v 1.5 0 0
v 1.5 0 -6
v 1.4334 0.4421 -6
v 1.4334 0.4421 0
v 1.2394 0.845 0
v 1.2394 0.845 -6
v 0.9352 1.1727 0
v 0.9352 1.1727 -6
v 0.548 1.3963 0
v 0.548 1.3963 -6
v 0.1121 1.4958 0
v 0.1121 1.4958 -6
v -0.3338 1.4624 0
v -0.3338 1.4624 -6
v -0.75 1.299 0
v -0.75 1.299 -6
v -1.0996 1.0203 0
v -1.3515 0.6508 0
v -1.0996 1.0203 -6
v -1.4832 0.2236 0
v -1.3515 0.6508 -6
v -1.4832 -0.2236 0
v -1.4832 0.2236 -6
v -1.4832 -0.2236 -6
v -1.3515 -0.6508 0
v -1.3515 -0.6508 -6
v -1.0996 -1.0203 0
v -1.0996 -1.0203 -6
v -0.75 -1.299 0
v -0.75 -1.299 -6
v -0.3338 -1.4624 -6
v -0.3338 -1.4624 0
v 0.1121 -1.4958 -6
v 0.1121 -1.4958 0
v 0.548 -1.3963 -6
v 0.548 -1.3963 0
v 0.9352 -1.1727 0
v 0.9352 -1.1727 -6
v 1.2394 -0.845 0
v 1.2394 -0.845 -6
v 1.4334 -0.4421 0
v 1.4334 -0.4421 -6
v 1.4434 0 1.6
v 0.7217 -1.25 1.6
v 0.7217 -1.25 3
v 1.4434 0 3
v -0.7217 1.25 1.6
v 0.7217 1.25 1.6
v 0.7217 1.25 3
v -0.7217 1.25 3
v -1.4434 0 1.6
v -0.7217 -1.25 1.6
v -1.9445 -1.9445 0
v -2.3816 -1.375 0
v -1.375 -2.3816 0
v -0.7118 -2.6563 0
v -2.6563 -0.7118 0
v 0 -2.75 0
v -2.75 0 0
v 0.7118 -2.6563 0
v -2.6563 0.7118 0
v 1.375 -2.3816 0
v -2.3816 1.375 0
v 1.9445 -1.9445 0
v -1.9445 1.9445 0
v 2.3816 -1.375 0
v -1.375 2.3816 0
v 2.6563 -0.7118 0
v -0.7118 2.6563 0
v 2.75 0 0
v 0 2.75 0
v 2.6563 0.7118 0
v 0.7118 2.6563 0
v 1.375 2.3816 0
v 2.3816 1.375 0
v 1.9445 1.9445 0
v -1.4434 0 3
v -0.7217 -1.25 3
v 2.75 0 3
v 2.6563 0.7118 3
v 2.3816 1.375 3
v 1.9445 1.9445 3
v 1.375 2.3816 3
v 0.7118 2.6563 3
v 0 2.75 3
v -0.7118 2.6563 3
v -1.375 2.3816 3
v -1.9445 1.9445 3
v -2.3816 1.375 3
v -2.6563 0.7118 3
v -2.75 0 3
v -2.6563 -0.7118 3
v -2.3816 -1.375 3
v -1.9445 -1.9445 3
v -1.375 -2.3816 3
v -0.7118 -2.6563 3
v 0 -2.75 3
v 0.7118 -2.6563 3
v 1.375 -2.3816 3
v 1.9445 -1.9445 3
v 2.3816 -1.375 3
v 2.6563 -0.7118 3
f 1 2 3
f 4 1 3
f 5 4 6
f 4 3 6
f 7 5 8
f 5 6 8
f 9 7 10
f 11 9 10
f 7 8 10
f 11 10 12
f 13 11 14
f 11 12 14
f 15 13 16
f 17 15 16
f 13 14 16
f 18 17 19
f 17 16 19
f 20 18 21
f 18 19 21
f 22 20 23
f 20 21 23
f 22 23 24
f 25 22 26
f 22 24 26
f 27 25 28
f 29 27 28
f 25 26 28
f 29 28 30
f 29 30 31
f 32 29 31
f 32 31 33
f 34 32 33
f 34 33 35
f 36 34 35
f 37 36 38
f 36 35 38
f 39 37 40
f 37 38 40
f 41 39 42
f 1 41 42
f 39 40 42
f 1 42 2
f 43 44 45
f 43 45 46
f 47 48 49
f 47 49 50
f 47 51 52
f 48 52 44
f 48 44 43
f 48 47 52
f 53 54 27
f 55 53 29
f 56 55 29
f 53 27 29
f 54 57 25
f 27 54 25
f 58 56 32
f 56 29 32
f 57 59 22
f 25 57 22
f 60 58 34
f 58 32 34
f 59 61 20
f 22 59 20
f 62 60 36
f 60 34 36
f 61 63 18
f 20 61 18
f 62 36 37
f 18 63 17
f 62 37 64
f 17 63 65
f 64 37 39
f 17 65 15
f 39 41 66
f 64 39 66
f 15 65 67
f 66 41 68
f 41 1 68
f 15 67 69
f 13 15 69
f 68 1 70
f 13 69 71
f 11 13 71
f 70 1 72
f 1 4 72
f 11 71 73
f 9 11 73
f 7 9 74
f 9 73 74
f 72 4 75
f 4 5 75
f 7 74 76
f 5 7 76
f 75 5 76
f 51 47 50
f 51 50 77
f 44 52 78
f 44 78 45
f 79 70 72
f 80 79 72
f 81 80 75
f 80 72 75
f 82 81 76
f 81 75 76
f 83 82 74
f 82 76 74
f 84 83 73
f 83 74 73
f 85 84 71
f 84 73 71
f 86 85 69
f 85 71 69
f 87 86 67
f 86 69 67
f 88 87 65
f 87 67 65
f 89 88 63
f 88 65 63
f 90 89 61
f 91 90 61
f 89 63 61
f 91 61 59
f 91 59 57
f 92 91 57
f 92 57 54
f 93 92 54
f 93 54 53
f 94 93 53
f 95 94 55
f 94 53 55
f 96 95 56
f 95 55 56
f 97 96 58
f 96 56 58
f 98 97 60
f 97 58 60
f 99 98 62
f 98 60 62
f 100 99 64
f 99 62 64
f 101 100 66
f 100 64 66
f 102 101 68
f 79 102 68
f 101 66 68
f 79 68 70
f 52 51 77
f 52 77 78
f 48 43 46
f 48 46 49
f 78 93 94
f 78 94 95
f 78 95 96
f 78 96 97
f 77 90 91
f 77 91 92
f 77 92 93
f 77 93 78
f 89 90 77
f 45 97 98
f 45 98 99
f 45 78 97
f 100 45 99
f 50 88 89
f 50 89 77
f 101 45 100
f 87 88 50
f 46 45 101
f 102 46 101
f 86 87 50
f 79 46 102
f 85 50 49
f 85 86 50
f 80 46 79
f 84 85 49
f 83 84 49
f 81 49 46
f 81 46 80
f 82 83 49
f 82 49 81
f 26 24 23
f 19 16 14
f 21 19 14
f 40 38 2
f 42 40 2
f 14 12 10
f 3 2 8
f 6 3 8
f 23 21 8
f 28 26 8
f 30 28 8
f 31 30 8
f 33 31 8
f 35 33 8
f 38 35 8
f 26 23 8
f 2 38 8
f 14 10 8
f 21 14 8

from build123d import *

# Parameters (mm, degrees)
ISO4762_HEAD_D5P5_H3_SKETCH_R       = 2.75
ISO4762_HEAD_D5P5_H3_DEPTH          = 3
M3_MAJOR_DIAMETER_ENVELOPE_START    = -6
M3_MAJOR_DIAMETER_ENVELOPE_SKETCH_R = 1.5
M3_MAJOR_DIAMETER_ENVELOPE_DEPTH    = 6
HEX_SOCKET_2P5AF_START              = 1.6
HEX_SOCKET_2P5AF_DEPTH              = 1.4


with BuildPart() as part:
    # ISO4762_head_D5p5_h3_Sketch → ISO4762_head_D5p5_h3 (new body)
    with BuildSketch(Plane.XY):
        Circle(ISO4762_HEAD_D5P5_H3_SKETCH_R)
    extrude(amount=ISO4762_HEAD_D5P5_H3_DEPTH)

    # M3_major_diameter_envelope_Sketch → M3_major_diameter_envelope (add)
    with BuildSketch(Plane.XY.offset(M3_MAJOR_DIAMETER_ENVELOPE_START)):
        Circle(M3_MAJOR_DIAMETER_ENVELOPE_SKETCH_R)
    extrude(amount=M3_MAJOR_DIAMETER_ENVELOPE_DEPTH)

    # Hex_socket_2p5AF_Sketch → Hex_socket_2p5AF (cut)
    with BuildSketch(Plane.XY.offset(HEX_SOCKET_2P5AF_START)):
        Polygon((1.443375673, 0), (0.721687836, 1.25), (-0.721687836, 1.25), (-1.443375673, 0), (-0.721687836, -1.25), (0.721687836, -1.25), align=None)
    extrude(amount=HEX_SOCKET_2P5AF_DEPTH, mode=Mode.SUBTRACT)


solid = part.part
